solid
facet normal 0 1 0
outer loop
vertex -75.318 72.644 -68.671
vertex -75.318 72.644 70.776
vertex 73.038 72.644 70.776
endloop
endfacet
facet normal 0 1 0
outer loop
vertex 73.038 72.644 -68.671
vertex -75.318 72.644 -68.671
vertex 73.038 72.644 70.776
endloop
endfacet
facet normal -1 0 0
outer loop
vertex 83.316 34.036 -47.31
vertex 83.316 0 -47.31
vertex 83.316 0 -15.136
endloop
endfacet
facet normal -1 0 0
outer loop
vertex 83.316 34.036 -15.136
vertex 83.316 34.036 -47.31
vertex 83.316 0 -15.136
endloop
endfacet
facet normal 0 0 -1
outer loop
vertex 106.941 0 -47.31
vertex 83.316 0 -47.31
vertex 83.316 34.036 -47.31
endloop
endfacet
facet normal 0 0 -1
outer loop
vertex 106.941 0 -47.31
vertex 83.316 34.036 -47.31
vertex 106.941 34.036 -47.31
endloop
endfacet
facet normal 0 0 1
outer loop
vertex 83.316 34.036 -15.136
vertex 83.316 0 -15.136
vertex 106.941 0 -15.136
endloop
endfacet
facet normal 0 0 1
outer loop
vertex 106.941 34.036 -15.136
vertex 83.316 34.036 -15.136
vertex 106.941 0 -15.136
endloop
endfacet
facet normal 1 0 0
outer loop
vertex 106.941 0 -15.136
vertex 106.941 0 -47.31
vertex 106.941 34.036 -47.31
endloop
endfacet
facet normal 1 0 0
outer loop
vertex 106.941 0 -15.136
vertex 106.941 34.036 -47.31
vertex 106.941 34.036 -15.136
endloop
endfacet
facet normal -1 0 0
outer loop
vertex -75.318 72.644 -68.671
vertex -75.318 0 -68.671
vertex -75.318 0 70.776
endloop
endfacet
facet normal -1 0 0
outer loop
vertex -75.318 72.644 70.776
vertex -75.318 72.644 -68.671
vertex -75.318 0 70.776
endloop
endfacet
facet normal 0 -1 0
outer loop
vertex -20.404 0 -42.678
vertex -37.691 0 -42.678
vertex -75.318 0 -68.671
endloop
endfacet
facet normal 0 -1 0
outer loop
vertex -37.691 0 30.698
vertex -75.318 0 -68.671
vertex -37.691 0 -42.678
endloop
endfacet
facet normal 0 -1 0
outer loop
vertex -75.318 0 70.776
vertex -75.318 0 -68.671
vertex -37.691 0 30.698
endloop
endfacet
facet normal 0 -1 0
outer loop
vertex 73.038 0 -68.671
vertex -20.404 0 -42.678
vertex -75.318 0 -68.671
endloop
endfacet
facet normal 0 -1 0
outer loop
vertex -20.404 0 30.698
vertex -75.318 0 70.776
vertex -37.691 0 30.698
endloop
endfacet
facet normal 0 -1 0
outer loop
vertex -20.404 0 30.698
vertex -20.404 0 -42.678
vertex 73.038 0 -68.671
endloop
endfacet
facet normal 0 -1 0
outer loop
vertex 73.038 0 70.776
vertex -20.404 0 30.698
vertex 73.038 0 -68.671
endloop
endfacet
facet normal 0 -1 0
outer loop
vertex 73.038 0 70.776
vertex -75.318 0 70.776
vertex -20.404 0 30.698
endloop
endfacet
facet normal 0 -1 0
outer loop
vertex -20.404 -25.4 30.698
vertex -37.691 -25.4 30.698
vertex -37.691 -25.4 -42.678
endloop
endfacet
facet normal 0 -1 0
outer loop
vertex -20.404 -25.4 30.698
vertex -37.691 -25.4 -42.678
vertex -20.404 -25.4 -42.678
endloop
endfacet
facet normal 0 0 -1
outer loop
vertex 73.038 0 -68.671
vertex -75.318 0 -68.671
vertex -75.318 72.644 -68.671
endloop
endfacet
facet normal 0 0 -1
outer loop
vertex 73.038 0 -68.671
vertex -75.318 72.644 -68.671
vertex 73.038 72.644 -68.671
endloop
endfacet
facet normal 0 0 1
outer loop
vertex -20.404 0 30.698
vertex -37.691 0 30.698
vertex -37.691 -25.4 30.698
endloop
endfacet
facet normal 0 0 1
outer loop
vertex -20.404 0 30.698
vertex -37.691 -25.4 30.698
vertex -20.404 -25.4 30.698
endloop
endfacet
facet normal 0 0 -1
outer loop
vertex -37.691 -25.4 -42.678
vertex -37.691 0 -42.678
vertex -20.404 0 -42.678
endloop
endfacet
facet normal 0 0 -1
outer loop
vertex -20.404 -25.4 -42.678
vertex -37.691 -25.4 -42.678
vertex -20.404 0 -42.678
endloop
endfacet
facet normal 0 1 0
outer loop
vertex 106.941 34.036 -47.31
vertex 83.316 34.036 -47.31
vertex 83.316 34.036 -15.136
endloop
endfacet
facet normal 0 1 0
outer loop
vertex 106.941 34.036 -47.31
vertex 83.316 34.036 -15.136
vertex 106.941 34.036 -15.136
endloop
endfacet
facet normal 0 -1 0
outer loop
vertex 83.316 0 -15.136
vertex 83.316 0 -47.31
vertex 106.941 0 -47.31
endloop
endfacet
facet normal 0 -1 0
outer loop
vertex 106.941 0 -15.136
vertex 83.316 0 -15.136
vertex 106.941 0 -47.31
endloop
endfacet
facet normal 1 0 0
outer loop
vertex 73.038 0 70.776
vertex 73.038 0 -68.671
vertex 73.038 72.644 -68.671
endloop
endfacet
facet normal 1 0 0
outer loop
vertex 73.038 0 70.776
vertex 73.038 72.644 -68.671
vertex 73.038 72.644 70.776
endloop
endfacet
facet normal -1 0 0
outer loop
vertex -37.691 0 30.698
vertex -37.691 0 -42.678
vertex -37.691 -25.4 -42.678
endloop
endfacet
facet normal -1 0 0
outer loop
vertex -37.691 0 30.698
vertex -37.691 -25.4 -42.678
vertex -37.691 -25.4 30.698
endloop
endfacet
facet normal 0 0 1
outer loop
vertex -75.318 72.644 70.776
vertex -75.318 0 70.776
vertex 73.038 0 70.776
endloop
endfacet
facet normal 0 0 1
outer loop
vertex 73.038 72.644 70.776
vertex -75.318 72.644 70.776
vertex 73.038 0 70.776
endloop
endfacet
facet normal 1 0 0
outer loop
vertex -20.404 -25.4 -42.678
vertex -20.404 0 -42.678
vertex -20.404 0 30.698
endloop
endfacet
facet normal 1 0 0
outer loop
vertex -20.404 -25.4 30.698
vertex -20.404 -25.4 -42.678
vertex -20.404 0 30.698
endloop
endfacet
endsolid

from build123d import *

# Parameters (mm, degrees)
F0_W     = 148.356453
F0_H     = 139.446944
F1_DEPTH = 72.644
F2_W     = 17.28671
F2_H     = 73.376162
F3_DEPTH = 25.4
F4_W     = 23.625166
F4_H     = 32.173844
F5_DEPTH = 34.036


with BuildPart() as f1:
    # F0 (on Front) → F1 (new body)
    with BuildSketch(Plane.XZ):
        with Locations((-1.140251, 1.052968)):
            Rectangle(F0_W, F0_H)
    extrude(amount=-F1_DEPTH)

    # F2 (on Front) → F3 (join)
    with BuildSketch(Plane.XZ):
        with Locations((-29.047467, -5.990245)):
            Rectangle(F2_W, F2_H)
    extrude(amount=F3_DEPTH)


with BuildPart() as f5:
    # F4 (on Front) → F5 (new body)
    with BuildSketch(Plane.XZ):
        with Locations((95.128715, -31.223367)):
            Rectangle(F4_W, F4_H)
    extrude(amount=-F5_DEPTH)


solid = Compound([f1.part, f5.part])
